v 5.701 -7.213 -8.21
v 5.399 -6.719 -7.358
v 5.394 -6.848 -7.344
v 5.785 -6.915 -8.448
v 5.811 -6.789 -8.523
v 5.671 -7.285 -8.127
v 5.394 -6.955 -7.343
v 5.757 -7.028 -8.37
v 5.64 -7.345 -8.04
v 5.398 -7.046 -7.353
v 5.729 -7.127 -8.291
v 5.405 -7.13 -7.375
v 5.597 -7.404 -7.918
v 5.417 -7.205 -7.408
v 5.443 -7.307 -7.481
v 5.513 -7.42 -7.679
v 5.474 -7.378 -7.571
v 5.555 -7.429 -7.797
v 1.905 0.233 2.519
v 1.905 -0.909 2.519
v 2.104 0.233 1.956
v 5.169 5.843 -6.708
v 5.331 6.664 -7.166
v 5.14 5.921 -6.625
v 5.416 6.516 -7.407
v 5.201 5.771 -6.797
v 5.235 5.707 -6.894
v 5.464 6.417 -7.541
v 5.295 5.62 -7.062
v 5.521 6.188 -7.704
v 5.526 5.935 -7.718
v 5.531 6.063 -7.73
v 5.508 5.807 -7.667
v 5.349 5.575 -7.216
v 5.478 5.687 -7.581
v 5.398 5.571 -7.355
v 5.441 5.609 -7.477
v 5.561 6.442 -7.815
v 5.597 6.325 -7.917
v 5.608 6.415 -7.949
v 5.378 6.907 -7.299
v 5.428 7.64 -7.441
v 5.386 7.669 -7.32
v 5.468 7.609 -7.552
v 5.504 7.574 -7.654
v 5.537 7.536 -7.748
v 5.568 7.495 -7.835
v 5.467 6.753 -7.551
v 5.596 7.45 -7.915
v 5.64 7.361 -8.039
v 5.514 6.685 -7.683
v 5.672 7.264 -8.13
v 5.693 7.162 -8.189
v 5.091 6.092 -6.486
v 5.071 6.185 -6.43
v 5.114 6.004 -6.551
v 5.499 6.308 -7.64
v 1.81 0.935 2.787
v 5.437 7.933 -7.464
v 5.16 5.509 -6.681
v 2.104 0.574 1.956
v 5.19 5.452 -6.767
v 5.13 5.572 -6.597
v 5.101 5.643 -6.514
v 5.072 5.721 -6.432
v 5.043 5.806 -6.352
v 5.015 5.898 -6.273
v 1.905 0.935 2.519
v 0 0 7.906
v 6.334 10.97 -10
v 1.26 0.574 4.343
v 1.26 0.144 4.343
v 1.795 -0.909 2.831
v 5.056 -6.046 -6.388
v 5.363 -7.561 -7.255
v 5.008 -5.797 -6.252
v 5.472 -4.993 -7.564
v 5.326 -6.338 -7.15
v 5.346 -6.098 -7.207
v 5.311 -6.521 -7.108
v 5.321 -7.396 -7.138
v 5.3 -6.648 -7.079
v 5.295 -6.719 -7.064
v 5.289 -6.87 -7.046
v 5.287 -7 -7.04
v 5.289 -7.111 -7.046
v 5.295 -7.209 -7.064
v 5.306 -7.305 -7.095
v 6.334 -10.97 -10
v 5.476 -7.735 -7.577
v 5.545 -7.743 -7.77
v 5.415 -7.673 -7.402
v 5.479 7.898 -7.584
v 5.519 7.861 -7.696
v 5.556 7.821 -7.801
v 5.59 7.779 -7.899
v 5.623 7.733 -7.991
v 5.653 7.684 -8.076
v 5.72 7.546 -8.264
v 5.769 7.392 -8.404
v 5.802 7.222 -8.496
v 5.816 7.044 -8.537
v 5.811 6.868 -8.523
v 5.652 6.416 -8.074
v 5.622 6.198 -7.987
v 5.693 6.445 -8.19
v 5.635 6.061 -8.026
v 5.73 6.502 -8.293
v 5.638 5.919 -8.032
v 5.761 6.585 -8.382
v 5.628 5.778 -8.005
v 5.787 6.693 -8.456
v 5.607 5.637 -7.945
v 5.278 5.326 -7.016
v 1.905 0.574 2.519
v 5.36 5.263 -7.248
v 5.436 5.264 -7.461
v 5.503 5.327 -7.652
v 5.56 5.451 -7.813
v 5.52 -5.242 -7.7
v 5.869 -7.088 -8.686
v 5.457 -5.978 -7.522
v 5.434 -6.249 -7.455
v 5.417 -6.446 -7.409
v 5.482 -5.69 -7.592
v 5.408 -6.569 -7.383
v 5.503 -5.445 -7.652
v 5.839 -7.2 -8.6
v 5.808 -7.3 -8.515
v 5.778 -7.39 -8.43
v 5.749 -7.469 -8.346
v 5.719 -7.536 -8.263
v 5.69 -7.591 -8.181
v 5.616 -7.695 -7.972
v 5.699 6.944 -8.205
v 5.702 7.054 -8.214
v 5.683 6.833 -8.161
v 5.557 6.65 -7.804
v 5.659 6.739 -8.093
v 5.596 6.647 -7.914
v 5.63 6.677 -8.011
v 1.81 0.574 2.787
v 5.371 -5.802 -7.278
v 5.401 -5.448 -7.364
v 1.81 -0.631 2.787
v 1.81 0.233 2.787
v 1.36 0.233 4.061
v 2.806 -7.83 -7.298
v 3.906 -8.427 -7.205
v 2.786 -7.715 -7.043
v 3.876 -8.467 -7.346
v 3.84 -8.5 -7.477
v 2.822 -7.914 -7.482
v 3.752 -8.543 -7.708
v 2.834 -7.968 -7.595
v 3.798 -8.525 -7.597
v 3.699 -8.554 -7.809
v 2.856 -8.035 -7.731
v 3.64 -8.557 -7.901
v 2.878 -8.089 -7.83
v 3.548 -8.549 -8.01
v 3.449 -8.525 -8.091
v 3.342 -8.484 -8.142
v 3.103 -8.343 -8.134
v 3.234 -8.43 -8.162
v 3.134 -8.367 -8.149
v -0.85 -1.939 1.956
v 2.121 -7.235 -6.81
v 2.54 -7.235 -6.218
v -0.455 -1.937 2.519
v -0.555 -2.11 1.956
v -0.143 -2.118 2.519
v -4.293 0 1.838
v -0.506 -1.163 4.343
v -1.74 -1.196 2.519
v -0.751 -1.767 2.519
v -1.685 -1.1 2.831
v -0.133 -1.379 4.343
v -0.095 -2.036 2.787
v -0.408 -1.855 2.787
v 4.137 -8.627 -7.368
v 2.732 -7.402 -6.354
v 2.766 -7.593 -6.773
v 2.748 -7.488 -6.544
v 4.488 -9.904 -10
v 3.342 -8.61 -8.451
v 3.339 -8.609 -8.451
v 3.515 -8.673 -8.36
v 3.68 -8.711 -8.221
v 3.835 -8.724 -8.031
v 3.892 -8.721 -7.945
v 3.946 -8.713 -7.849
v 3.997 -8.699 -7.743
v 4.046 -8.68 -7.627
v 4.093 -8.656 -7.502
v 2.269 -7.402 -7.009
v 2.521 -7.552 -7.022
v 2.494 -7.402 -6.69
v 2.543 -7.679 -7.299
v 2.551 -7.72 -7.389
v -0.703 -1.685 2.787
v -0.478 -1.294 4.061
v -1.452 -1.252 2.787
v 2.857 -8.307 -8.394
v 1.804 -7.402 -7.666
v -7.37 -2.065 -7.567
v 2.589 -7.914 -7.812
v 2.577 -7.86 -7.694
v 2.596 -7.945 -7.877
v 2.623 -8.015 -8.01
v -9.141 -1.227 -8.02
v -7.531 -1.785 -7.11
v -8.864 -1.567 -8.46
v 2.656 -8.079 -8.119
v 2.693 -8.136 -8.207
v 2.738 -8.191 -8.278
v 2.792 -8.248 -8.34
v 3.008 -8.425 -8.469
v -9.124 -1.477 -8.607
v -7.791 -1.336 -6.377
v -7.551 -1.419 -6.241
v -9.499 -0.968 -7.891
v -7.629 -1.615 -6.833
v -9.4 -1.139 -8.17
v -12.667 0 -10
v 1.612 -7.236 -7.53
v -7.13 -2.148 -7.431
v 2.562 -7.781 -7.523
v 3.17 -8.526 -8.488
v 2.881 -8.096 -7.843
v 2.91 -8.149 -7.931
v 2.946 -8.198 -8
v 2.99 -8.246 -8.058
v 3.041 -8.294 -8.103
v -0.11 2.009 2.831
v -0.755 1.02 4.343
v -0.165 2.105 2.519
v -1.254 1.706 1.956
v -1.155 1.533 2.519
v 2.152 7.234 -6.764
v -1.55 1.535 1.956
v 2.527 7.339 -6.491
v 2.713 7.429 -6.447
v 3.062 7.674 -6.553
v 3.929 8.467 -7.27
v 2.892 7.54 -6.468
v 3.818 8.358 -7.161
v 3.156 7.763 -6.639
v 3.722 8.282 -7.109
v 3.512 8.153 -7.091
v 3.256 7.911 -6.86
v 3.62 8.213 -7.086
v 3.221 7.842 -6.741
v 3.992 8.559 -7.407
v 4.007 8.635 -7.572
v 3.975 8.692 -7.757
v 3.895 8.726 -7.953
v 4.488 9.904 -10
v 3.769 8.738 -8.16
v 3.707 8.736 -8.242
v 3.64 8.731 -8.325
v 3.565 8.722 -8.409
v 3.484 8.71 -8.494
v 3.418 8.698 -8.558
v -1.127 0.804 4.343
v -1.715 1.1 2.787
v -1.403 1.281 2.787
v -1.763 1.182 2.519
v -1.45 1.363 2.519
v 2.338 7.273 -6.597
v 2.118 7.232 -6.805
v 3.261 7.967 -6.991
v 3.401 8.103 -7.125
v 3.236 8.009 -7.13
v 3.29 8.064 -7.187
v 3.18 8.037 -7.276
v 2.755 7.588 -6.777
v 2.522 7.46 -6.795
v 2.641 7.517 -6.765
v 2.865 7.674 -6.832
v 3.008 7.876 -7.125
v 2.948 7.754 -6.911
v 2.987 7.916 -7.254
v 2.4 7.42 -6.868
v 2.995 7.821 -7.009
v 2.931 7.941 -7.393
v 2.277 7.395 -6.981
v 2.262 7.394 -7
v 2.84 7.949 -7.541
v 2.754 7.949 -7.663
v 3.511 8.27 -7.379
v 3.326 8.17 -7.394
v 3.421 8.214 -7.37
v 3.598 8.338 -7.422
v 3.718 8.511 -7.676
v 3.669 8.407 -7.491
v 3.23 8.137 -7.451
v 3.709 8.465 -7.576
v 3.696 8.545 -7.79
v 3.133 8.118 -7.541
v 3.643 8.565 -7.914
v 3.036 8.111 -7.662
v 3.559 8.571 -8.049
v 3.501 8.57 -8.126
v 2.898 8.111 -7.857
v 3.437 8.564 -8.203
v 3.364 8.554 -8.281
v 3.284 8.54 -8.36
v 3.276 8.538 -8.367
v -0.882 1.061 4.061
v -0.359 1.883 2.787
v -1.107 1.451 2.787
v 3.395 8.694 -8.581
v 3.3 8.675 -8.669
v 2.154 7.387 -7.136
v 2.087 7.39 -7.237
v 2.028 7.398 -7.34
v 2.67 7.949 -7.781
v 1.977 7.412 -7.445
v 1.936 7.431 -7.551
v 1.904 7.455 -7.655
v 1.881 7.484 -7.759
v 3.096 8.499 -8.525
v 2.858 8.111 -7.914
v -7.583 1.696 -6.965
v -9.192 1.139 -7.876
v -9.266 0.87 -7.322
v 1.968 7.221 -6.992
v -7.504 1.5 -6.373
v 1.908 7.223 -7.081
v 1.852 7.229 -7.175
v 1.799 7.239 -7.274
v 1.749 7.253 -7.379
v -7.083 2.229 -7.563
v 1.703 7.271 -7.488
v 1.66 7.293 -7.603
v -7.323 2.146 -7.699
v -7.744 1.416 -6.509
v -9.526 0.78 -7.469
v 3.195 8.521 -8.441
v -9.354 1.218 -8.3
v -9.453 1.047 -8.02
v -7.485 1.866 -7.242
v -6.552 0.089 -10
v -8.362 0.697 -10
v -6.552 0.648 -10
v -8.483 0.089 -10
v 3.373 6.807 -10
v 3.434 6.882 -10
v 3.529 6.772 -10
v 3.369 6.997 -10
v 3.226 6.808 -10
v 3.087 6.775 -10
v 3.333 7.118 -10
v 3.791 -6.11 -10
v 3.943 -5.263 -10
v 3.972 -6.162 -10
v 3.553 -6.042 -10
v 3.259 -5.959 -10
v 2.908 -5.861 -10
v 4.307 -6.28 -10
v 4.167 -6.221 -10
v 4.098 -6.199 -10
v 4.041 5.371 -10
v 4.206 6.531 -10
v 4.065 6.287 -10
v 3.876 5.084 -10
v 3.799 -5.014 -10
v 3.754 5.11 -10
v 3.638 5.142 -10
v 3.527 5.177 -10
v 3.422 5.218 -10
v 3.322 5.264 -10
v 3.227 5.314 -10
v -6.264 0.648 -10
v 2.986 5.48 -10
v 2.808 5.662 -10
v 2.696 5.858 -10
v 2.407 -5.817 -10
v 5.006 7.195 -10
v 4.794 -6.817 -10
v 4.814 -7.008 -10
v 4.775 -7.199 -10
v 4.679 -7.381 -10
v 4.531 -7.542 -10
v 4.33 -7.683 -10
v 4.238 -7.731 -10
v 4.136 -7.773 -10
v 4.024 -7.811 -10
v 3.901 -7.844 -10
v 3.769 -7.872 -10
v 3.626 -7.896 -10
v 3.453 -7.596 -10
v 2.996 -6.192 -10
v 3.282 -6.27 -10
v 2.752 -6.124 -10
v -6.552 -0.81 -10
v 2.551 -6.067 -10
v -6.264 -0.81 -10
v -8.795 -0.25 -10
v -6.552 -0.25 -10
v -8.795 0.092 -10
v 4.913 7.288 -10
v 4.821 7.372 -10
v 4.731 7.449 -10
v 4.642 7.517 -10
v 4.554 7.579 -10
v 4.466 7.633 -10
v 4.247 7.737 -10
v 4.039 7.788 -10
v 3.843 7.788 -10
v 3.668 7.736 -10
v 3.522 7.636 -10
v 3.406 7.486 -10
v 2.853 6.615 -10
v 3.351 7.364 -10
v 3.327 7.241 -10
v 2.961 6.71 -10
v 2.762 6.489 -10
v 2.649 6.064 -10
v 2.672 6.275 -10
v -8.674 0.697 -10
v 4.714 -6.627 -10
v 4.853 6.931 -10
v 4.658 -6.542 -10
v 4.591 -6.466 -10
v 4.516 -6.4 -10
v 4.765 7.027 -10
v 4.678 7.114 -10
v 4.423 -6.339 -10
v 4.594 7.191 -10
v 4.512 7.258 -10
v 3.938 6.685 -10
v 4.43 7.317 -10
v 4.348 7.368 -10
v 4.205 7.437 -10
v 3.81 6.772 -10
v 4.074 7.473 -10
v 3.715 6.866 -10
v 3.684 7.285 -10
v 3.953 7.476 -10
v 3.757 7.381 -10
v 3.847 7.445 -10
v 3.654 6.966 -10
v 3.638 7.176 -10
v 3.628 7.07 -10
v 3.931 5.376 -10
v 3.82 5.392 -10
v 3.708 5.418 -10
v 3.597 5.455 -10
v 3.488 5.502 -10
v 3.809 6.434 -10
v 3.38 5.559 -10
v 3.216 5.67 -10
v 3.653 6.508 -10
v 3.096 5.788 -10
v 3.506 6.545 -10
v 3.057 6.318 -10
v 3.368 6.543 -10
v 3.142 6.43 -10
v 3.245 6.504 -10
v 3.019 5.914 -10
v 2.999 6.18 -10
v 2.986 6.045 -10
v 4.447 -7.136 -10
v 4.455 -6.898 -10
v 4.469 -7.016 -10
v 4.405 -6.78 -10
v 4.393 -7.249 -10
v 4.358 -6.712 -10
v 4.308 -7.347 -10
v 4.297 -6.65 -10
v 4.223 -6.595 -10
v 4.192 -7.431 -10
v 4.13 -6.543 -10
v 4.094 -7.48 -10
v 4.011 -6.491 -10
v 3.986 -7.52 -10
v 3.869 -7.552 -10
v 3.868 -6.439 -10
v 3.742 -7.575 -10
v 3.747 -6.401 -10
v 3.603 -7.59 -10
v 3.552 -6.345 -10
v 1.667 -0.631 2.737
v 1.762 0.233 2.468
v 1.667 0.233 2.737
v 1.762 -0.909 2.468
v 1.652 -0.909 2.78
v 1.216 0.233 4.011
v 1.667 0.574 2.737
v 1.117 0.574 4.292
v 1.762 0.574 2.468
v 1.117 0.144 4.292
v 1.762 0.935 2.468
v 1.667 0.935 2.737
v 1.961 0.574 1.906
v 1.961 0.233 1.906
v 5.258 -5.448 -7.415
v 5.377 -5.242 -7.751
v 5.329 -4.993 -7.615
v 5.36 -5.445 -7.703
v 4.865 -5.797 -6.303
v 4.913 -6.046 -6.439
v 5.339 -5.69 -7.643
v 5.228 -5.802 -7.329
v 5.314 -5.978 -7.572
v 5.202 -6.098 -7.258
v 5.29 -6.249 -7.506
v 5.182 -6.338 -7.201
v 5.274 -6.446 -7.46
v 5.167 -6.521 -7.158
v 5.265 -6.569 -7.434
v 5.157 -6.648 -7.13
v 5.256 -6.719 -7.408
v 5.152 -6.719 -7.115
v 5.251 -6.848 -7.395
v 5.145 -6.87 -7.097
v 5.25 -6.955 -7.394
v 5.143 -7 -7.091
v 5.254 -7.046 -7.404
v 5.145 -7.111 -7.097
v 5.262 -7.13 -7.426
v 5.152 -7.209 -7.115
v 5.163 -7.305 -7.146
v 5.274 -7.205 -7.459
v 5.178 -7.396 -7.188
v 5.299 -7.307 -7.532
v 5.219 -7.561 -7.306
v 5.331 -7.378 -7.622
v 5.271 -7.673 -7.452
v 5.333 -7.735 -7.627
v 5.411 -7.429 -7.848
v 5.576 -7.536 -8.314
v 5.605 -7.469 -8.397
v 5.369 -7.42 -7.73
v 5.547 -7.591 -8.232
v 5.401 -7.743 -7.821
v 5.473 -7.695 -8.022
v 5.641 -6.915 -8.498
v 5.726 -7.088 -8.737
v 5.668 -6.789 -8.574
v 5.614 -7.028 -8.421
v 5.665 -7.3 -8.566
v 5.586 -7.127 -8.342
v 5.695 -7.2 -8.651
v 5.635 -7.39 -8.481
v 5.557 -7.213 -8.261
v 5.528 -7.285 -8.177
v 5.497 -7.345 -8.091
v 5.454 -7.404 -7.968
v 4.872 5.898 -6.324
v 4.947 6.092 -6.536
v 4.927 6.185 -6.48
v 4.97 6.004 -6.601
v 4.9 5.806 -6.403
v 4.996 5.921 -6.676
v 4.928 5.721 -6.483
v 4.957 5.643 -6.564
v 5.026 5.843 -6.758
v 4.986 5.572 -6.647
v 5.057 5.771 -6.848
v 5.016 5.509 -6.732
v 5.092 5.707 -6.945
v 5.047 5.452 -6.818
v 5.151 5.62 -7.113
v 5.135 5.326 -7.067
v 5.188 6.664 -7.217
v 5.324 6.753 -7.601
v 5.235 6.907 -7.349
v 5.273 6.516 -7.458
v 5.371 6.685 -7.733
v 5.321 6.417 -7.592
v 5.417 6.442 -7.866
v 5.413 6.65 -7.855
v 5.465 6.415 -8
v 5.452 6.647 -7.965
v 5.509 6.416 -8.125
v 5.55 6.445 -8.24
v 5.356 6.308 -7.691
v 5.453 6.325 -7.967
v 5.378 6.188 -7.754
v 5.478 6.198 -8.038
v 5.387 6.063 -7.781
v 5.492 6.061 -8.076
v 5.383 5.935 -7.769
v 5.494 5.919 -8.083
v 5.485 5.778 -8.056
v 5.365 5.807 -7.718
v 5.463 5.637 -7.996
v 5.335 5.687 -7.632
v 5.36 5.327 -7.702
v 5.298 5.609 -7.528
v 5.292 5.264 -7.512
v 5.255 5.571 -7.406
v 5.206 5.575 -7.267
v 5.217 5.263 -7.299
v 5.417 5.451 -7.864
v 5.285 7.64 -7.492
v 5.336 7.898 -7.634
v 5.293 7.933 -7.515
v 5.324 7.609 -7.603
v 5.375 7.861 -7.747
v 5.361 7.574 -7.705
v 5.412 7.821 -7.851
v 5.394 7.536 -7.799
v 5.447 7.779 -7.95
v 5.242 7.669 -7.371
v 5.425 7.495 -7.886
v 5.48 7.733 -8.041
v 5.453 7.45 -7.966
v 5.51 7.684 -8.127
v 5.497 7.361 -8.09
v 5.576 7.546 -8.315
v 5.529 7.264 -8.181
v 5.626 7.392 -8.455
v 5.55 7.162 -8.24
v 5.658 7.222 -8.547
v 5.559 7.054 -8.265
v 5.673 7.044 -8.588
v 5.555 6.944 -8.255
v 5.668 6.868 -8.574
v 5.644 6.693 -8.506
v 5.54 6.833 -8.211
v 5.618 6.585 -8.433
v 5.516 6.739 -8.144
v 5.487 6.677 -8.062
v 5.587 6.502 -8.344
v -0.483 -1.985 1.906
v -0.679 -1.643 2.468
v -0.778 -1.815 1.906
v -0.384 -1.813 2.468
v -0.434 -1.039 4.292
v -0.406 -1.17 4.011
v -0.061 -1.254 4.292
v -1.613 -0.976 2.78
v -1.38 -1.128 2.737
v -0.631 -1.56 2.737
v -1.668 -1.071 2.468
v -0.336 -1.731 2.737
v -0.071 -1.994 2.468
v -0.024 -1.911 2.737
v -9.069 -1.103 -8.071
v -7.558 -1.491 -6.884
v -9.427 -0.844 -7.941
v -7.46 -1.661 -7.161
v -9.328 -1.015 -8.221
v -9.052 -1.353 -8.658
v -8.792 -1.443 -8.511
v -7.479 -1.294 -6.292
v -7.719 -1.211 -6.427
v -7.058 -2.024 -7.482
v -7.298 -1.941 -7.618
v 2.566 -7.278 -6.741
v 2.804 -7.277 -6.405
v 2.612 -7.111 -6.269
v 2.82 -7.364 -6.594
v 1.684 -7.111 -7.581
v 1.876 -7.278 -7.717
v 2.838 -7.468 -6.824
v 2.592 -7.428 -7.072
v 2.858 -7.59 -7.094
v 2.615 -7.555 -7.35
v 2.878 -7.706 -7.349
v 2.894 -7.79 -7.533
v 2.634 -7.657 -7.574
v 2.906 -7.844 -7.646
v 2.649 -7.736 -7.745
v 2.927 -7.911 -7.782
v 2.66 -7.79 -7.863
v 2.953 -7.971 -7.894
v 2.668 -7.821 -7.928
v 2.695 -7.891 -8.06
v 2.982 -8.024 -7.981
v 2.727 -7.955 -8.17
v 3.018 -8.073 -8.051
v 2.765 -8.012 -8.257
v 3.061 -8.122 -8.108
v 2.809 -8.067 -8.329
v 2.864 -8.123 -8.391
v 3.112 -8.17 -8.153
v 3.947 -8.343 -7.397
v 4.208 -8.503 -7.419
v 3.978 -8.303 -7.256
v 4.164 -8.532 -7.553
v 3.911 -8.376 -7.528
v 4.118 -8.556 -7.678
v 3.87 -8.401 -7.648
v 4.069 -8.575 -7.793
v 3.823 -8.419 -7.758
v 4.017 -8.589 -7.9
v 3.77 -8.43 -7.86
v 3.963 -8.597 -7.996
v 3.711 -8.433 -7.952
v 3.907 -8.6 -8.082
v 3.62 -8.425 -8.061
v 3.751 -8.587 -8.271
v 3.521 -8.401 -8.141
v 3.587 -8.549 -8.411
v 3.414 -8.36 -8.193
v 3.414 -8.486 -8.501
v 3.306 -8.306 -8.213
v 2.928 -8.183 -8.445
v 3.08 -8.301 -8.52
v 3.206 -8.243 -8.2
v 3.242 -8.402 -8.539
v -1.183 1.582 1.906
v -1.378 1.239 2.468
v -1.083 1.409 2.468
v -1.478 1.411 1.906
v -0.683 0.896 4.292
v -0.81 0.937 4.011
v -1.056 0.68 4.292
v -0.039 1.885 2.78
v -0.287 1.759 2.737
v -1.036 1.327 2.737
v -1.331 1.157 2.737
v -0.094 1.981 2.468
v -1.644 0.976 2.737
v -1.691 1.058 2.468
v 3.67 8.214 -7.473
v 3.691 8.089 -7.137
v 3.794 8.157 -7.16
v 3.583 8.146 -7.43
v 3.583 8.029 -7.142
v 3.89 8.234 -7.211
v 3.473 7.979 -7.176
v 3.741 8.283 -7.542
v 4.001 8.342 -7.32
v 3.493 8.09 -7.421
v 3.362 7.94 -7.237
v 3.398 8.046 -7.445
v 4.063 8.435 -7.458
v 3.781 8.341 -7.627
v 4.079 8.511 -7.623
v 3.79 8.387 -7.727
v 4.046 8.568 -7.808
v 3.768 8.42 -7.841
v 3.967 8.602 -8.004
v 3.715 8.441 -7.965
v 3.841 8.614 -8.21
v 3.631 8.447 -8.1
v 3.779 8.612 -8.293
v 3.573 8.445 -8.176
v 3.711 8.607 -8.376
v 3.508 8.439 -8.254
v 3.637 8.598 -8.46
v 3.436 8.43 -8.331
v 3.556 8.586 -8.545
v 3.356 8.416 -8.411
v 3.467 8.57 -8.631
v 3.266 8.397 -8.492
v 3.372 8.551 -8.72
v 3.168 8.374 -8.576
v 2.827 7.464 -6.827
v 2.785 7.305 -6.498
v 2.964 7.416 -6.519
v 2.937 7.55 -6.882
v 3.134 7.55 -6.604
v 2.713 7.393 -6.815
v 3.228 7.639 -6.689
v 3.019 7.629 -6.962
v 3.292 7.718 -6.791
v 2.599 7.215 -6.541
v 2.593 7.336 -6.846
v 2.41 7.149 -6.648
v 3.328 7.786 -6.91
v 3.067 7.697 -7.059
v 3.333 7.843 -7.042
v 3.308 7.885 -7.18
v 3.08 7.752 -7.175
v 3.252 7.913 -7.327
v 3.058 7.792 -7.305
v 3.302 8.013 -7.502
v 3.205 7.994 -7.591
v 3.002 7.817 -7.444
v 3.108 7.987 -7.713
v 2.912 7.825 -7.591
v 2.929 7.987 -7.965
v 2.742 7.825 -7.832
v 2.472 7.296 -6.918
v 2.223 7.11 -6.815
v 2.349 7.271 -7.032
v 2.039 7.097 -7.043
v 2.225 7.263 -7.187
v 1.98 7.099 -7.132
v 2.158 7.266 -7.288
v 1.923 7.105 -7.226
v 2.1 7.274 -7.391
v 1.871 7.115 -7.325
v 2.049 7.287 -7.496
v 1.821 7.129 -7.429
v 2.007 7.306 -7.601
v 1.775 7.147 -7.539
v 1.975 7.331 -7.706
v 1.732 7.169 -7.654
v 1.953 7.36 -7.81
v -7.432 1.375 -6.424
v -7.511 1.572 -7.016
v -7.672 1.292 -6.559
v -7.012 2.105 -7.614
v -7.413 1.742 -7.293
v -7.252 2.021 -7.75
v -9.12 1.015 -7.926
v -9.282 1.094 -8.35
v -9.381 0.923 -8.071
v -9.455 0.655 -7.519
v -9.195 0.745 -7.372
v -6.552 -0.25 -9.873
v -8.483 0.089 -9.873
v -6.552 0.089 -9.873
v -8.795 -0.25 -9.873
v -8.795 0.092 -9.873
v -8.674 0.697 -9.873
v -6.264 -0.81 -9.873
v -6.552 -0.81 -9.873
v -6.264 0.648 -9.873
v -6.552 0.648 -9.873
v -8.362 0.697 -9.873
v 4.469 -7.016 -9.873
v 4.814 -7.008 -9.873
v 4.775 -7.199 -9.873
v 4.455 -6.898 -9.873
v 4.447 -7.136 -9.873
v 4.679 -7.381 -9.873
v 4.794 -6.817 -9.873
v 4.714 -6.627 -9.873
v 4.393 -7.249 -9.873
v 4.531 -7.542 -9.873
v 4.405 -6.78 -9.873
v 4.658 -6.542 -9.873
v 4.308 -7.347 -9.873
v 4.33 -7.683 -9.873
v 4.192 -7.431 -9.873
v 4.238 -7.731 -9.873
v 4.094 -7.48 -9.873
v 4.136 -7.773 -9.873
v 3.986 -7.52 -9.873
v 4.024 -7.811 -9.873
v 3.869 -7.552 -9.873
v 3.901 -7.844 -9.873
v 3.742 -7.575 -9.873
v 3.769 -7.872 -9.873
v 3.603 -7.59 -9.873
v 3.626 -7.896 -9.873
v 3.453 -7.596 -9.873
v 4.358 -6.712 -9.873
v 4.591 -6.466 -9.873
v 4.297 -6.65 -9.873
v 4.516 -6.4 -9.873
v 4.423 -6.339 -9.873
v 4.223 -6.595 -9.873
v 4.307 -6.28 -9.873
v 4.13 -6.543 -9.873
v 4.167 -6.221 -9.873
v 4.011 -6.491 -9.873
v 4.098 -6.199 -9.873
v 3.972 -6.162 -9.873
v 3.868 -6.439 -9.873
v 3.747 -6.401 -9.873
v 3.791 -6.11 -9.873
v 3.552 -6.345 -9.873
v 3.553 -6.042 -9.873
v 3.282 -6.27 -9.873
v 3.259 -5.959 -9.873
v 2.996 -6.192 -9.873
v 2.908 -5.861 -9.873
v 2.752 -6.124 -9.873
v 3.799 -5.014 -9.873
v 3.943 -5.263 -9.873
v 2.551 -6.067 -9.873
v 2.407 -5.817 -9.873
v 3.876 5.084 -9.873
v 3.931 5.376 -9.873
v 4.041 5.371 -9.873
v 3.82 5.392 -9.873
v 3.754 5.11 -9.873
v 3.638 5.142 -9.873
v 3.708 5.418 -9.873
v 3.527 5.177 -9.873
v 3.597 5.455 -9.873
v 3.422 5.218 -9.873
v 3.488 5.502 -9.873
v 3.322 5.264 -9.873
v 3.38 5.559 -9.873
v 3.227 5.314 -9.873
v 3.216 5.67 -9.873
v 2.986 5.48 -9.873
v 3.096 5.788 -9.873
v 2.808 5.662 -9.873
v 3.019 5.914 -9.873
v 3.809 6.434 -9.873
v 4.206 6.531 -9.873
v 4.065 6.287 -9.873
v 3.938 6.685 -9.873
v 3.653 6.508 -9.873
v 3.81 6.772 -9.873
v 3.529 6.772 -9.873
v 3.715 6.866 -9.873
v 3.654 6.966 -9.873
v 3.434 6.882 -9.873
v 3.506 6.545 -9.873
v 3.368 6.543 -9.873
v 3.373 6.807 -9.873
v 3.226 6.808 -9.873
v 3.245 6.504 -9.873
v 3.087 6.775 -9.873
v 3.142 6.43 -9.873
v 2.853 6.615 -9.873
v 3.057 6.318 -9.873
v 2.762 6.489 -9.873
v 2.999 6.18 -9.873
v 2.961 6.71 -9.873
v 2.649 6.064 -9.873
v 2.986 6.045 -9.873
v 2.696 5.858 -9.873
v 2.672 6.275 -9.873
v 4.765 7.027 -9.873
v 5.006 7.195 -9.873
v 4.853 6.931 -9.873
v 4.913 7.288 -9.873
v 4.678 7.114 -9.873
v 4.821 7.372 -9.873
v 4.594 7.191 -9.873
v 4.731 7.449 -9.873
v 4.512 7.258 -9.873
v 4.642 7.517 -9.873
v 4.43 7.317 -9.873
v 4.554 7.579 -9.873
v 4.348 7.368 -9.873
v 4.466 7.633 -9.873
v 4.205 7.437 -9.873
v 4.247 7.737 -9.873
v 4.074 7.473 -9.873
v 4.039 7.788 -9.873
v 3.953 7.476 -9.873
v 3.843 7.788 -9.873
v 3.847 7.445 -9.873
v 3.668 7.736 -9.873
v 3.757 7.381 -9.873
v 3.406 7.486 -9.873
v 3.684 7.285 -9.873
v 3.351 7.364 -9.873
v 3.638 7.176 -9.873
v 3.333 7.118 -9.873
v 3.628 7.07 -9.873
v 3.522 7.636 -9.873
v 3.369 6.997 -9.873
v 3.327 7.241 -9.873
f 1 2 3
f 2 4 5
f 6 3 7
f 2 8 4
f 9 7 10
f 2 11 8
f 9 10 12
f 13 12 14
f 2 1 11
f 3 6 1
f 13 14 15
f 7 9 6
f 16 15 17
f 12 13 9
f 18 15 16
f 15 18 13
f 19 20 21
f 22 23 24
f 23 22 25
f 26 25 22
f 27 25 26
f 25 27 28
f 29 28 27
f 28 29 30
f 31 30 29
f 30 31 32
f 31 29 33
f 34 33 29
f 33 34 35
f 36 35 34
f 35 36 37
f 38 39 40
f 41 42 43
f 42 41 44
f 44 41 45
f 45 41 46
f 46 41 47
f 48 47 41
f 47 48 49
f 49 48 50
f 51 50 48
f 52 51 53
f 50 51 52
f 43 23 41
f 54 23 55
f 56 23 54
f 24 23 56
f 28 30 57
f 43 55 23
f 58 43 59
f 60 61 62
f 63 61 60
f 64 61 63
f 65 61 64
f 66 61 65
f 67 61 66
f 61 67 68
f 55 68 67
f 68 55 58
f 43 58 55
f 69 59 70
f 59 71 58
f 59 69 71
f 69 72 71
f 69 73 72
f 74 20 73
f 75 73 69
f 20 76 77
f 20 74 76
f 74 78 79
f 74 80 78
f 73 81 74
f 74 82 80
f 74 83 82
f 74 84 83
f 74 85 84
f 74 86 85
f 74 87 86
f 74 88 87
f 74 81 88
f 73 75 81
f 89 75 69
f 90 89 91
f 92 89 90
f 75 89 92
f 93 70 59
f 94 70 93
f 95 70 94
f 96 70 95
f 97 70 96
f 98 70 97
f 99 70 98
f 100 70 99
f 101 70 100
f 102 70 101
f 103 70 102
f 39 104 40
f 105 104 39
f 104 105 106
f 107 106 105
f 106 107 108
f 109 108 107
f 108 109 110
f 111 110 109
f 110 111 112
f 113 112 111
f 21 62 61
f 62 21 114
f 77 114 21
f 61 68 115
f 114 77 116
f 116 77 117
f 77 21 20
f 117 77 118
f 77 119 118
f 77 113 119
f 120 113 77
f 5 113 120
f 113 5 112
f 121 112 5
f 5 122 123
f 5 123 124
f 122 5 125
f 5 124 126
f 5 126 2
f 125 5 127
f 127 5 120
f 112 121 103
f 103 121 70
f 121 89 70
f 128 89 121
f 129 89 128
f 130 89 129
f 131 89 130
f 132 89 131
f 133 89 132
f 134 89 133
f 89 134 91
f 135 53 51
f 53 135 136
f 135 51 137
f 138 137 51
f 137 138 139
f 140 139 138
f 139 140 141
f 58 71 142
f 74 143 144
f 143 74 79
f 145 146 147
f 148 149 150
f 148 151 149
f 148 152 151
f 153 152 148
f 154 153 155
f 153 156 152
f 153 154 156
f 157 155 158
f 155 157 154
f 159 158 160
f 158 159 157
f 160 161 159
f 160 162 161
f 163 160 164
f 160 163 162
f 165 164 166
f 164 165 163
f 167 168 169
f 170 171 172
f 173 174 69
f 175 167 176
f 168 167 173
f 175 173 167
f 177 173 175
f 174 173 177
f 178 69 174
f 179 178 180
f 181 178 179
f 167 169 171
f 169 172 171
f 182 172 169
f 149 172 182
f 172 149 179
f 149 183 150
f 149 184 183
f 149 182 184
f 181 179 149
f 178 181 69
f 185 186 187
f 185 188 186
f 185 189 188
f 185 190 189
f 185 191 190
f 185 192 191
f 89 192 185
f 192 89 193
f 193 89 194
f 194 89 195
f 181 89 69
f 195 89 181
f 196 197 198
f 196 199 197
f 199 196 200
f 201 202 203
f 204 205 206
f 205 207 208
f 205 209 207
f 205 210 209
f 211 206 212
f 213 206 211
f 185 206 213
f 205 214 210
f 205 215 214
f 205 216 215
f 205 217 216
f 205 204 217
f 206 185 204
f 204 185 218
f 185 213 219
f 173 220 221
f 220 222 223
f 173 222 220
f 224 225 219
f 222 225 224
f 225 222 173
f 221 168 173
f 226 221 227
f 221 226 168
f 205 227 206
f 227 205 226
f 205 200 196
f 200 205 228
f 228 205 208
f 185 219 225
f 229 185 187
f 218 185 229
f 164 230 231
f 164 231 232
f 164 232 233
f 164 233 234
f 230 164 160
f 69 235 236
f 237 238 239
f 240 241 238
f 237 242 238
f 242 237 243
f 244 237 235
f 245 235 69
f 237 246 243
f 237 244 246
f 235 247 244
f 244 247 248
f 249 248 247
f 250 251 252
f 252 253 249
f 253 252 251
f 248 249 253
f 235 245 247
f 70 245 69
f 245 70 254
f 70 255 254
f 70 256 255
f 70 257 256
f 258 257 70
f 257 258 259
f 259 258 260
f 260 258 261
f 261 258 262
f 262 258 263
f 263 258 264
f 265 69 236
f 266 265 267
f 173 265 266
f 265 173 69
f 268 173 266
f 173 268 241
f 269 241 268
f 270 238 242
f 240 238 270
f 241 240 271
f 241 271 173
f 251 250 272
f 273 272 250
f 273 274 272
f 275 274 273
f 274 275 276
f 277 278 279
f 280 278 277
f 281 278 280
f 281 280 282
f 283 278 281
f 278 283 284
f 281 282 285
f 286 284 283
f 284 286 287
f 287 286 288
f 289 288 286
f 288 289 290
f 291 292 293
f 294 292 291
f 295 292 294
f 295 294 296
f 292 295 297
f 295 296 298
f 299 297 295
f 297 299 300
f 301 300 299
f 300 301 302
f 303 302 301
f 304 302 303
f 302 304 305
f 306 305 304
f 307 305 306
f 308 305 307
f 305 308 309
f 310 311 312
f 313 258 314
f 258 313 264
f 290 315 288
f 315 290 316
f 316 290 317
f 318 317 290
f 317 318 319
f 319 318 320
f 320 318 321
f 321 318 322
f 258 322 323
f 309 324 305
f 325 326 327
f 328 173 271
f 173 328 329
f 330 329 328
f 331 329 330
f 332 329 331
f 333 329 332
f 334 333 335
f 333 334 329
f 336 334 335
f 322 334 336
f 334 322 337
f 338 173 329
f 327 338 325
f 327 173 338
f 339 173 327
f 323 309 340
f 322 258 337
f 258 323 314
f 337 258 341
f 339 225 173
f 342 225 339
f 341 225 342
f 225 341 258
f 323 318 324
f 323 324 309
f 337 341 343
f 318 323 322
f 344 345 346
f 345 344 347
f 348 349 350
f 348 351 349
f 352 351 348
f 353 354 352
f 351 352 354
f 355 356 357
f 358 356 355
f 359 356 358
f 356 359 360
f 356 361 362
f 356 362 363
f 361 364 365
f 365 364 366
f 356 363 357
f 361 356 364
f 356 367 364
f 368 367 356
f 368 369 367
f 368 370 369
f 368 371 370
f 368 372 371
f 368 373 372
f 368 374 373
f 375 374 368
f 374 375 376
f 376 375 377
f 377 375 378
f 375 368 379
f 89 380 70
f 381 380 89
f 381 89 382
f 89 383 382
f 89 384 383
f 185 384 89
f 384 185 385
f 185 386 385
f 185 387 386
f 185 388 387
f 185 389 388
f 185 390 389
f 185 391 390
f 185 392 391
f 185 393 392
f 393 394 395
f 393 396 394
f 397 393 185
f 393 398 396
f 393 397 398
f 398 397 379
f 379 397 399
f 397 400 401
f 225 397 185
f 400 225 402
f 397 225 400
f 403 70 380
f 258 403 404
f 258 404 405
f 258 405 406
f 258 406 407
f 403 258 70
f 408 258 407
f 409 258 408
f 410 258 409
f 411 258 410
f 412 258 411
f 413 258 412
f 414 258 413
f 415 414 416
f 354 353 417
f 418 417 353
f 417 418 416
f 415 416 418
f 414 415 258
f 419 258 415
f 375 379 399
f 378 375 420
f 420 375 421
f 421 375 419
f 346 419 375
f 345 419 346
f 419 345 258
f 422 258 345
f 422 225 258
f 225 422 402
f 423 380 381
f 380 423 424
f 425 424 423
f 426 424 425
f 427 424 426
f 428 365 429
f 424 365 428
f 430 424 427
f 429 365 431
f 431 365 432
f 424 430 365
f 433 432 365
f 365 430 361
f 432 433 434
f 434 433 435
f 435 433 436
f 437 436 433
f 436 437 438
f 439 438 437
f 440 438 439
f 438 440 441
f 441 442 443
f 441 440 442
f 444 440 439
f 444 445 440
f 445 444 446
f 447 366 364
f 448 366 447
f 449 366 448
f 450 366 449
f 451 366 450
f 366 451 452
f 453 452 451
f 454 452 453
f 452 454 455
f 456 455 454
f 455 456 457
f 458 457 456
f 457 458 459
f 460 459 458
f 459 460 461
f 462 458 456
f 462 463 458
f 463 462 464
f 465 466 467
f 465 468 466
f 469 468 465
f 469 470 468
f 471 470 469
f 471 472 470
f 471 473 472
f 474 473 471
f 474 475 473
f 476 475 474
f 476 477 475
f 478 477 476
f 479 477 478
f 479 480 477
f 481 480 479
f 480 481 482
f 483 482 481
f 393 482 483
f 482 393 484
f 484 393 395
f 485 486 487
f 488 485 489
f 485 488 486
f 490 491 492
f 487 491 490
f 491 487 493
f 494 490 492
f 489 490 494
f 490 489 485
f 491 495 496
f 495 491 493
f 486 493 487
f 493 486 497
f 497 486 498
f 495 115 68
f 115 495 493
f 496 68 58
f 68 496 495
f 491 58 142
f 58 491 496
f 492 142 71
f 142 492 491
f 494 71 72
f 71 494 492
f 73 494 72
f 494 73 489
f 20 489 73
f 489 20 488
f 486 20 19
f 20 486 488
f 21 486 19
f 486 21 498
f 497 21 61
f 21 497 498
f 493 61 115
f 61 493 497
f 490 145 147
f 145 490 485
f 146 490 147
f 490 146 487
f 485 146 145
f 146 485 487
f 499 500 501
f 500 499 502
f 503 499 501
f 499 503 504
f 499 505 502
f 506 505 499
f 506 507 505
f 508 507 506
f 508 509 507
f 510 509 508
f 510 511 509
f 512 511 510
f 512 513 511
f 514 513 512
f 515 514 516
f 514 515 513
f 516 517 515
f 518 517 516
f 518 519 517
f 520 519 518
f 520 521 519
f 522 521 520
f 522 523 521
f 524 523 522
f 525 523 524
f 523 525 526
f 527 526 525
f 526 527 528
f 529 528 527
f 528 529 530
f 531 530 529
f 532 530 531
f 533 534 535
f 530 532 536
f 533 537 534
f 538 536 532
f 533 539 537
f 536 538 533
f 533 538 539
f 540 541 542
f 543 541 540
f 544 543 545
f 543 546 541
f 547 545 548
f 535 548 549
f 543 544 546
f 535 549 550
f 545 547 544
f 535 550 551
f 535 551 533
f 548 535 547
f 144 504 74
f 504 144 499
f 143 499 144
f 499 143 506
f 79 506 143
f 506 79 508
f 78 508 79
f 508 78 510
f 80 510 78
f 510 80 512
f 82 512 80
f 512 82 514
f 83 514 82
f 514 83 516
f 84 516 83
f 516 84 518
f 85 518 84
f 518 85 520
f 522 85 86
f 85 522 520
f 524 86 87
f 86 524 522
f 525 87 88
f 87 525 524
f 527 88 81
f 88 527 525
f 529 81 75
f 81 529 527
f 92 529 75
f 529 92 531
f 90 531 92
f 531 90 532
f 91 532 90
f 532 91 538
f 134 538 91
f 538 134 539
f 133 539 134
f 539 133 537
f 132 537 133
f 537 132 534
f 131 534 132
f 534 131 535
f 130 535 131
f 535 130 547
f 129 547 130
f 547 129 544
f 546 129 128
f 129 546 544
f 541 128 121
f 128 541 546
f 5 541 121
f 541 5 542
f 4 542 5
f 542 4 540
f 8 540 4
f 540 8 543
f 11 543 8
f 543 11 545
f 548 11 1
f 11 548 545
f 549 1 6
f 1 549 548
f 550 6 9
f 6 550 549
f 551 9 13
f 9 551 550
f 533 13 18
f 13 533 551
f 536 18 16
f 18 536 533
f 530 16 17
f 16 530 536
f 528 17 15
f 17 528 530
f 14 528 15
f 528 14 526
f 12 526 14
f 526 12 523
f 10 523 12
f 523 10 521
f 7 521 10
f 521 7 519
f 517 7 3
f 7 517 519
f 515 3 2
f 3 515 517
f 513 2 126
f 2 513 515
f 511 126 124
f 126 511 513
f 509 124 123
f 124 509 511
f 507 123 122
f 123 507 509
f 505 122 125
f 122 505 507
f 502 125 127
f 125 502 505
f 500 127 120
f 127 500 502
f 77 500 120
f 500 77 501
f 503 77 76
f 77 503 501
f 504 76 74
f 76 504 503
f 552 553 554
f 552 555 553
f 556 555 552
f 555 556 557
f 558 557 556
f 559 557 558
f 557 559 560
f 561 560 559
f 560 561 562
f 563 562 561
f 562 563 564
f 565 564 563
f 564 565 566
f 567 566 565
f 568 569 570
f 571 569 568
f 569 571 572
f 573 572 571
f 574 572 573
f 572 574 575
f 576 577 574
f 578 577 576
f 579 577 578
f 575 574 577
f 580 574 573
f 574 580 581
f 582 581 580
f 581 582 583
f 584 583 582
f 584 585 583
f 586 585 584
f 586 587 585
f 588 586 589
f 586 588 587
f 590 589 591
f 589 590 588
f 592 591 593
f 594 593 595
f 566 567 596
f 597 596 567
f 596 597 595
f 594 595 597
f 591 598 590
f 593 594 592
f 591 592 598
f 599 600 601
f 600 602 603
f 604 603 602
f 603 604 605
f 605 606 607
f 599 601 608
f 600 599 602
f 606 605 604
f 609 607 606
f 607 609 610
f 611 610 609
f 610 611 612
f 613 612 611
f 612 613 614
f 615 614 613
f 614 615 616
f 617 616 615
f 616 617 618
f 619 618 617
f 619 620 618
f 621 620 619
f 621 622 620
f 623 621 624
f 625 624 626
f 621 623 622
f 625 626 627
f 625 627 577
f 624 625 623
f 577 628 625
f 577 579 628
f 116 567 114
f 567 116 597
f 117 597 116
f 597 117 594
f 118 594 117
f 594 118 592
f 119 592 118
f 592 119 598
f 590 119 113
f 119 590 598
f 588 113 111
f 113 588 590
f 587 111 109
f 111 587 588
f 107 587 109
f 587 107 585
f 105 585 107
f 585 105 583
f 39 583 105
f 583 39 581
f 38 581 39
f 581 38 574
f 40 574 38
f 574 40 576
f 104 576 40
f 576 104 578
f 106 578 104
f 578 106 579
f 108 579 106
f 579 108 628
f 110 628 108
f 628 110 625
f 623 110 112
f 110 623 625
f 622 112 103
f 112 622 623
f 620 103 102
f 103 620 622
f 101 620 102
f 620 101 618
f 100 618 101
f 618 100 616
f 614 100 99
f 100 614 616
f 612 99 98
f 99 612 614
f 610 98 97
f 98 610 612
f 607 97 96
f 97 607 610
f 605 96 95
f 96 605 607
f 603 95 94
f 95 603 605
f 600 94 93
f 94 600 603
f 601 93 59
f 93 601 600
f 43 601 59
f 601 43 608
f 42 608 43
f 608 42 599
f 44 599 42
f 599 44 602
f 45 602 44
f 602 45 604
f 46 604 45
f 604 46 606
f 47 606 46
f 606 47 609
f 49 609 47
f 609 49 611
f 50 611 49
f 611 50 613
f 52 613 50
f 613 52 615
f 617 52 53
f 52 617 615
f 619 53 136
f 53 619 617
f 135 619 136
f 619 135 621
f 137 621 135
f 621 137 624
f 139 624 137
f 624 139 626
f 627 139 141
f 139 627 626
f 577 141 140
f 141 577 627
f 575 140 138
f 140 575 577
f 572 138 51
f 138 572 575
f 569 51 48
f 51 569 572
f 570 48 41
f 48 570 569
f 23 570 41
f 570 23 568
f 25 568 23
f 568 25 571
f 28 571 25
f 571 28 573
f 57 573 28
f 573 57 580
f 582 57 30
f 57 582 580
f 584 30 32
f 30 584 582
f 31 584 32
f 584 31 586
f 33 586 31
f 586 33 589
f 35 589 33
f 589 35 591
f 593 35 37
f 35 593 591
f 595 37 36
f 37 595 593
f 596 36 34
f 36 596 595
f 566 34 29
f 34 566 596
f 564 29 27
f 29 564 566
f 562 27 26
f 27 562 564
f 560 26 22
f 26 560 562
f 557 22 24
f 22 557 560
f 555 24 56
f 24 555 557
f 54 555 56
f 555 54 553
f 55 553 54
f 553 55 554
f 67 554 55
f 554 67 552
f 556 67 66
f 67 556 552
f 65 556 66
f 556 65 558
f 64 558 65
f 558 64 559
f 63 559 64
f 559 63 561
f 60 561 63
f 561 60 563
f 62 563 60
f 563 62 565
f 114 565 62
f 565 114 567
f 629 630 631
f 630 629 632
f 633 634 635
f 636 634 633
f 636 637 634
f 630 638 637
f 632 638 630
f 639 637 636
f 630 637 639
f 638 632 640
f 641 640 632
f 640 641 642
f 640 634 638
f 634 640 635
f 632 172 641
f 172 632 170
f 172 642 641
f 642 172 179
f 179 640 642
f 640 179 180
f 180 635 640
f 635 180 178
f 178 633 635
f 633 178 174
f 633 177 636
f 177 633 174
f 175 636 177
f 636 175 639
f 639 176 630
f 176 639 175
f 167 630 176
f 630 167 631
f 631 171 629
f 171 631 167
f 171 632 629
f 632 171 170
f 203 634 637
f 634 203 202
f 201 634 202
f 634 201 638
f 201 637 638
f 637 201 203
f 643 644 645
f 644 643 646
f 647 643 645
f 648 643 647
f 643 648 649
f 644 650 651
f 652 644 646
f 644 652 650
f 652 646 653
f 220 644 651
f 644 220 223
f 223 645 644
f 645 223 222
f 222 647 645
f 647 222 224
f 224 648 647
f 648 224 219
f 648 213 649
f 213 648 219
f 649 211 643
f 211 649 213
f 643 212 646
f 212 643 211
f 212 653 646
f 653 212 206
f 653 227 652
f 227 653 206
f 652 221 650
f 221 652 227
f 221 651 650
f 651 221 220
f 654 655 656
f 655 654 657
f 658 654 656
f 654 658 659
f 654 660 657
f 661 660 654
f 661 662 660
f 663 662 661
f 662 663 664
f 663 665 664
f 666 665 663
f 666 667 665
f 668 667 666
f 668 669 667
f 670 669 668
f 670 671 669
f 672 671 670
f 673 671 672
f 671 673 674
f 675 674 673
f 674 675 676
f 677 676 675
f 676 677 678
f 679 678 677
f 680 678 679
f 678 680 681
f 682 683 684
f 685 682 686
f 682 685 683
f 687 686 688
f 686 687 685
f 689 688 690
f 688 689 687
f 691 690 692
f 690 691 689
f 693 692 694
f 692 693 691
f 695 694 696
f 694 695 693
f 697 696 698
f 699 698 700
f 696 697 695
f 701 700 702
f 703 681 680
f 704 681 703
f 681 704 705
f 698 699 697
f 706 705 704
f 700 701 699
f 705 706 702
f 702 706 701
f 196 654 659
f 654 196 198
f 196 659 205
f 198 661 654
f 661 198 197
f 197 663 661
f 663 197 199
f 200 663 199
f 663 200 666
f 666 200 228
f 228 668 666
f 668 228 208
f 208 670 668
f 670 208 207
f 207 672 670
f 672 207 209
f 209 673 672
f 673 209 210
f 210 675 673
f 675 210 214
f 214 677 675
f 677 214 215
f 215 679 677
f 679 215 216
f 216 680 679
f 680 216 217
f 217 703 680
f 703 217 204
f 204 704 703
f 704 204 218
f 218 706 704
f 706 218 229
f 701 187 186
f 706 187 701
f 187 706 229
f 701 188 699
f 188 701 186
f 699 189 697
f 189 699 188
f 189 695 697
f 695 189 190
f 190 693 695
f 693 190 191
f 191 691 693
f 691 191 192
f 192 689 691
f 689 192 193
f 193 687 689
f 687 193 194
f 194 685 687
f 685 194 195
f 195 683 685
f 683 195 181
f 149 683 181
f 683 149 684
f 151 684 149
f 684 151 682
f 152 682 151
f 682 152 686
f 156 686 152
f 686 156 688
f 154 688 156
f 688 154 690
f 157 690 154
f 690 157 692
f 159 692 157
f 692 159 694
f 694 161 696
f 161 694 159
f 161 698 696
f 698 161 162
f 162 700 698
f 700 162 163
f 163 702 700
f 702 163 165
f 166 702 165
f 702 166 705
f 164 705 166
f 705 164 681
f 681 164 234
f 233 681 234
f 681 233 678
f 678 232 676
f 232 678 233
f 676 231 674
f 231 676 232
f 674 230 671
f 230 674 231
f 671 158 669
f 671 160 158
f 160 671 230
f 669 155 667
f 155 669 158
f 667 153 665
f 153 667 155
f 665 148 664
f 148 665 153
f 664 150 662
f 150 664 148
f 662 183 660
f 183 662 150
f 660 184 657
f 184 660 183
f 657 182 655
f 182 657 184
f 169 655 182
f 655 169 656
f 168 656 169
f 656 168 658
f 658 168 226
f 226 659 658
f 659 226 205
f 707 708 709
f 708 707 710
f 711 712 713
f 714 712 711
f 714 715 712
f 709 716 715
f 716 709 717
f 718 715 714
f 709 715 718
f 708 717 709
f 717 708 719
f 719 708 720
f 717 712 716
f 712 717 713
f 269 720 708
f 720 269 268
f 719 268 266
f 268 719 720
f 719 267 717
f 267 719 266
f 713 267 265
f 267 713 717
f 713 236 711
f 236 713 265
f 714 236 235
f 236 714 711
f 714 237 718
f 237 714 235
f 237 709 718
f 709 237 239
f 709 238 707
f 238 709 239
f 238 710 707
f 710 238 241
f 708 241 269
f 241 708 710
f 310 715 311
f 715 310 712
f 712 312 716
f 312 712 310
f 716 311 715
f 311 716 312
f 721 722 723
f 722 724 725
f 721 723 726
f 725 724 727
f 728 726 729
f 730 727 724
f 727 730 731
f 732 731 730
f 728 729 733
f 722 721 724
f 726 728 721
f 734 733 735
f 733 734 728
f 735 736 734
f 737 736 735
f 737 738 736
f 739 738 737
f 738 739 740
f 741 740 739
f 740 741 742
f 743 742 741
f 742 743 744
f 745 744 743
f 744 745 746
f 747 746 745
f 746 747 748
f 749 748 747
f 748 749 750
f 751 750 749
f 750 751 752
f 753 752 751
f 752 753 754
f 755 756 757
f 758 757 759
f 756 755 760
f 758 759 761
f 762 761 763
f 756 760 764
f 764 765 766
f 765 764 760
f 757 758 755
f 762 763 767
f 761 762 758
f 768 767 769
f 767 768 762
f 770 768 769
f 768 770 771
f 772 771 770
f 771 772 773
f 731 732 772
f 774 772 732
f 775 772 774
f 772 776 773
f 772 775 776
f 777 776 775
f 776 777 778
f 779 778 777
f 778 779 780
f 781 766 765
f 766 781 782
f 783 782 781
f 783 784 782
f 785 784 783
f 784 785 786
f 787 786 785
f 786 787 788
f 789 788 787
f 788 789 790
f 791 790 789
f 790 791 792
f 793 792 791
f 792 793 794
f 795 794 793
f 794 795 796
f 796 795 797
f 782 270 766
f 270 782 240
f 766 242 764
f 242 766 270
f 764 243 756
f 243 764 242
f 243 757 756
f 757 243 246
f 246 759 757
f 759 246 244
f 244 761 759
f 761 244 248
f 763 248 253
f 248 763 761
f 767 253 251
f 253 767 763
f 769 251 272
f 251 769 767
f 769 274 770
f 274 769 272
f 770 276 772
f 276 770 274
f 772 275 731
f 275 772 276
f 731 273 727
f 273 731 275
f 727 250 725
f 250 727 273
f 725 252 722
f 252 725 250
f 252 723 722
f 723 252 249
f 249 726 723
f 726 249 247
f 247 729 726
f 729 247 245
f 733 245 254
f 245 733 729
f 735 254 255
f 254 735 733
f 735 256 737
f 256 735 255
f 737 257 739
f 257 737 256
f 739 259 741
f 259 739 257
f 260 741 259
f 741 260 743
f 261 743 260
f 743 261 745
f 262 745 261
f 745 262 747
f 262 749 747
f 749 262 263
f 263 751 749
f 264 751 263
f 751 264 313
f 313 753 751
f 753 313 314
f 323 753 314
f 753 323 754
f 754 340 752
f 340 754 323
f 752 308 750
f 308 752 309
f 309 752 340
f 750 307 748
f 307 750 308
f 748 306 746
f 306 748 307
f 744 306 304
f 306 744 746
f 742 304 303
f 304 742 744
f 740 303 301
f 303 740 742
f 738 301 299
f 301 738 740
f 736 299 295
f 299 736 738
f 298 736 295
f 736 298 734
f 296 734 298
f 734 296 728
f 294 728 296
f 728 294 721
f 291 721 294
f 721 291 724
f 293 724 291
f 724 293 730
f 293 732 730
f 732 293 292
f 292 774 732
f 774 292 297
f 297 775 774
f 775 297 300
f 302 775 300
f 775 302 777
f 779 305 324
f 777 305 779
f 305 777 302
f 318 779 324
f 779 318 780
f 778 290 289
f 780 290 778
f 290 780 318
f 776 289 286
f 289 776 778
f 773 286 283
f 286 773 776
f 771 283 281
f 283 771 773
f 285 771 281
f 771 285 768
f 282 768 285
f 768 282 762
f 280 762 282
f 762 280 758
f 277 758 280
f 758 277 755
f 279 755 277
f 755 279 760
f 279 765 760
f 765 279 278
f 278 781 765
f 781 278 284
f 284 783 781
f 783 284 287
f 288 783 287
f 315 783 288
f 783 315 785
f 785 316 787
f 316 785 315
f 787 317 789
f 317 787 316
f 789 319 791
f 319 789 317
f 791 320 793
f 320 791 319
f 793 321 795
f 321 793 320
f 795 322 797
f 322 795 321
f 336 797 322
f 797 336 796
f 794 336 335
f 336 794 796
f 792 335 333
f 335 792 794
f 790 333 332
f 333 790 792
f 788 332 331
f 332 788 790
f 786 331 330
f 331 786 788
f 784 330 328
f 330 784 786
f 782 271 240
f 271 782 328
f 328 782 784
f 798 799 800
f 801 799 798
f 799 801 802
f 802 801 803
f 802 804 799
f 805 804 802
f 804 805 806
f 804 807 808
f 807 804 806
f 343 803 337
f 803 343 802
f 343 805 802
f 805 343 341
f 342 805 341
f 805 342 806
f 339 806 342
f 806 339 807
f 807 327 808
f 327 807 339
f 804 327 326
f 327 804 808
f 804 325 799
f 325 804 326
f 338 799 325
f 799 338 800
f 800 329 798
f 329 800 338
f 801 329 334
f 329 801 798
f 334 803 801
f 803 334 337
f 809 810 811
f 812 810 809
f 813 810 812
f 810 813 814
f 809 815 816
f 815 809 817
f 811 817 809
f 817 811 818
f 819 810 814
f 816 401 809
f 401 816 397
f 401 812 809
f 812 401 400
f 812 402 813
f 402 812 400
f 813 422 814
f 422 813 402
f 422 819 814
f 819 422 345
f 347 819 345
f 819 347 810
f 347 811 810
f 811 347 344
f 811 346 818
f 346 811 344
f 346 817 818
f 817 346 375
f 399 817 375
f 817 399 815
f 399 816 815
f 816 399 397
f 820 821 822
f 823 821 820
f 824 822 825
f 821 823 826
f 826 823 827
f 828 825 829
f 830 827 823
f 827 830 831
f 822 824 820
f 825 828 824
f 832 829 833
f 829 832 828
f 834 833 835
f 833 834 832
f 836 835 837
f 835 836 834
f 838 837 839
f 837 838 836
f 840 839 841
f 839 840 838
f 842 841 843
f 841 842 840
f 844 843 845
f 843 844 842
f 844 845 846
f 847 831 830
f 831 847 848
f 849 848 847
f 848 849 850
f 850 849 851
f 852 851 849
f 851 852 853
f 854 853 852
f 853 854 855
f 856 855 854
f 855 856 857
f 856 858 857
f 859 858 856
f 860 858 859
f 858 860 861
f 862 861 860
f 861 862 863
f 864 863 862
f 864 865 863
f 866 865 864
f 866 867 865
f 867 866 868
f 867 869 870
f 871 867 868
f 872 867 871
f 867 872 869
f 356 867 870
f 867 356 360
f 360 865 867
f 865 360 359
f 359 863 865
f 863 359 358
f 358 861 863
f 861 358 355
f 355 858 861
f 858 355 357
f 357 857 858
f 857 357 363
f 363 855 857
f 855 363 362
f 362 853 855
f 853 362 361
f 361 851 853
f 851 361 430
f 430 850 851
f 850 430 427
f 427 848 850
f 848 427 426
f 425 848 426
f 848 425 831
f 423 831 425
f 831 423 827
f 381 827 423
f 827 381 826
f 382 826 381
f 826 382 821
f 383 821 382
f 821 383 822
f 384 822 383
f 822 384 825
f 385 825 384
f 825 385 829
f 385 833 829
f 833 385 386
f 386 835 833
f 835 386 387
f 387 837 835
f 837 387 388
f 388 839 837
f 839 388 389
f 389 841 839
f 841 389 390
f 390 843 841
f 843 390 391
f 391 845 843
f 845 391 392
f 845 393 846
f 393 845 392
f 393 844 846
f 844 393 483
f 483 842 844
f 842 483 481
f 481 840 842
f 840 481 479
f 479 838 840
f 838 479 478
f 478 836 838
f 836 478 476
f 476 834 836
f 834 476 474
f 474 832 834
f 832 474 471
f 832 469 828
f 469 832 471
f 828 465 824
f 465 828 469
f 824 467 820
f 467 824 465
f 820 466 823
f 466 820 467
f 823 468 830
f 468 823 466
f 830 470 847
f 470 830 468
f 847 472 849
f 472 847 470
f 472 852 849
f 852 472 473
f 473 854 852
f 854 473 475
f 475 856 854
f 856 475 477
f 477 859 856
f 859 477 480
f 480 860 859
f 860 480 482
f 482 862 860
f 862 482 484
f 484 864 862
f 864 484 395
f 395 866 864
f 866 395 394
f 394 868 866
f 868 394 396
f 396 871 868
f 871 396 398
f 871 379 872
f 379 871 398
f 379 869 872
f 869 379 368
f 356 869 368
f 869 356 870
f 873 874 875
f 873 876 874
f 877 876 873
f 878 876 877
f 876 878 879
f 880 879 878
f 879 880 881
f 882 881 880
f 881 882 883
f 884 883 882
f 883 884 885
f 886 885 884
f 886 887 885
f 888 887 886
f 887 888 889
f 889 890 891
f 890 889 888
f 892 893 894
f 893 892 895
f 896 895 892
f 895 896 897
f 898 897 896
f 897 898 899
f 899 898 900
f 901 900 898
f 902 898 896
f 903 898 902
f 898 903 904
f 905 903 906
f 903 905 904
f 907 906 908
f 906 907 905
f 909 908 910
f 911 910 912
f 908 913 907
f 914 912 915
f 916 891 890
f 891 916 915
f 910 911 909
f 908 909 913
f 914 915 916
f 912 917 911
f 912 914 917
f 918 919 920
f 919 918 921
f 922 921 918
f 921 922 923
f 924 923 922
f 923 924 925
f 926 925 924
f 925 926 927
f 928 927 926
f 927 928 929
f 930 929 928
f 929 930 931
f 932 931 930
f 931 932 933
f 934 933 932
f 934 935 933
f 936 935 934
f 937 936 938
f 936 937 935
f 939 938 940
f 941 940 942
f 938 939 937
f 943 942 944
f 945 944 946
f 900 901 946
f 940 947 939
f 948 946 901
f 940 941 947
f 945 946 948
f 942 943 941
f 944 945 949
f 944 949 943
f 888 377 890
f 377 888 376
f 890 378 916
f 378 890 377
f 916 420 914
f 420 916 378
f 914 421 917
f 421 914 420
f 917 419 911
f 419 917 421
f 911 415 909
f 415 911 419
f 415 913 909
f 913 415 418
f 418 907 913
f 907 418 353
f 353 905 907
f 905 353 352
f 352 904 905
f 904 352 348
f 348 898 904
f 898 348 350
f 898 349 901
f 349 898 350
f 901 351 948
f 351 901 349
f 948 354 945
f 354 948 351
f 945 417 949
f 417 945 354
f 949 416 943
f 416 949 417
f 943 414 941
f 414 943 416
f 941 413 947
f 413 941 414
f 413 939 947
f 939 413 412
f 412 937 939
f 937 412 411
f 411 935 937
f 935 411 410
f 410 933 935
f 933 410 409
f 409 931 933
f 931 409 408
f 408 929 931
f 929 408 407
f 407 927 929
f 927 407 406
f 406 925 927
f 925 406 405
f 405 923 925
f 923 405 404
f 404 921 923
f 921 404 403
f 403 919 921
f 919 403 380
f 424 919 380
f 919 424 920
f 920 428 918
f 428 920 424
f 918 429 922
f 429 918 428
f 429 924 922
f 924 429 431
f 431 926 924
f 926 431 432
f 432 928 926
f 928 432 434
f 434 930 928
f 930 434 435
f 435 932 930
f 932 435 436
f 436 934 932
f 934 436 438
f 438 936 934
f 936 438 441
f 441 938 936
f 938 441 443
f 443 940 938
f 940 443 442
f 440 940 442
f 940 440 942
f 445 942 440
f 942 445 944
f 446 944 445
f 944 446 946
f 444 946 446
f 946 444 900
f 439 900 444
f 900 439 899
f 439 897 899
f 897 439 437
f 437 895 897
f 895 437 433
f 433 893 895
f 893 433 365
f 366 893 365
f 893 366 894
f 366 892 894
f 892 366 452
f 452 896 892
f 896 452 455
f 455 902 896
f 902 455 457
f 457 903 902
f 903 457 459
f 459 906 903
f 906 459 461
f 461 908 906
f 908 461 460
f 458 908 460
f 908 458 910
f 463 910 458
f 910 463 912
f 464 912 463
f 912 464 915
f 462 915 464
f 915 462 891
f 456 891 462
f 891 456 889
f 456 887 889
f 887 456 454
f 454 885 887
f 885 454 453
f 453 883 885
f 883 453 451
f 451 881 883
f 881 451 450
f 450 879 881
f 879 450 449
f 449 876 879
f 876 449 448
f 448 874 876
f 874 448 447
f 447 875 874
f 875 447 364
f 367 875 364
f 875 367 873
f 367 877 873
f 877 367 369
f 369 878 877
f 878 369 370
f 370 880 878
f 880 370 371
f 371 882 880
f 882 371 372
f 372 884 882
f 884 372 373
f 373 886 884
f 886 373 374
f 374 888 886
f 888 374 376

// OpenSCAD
module draw_rot_dig(a, angle, dist){
    
        translate([-cos(angle)*dist, -sin(angle)*dist, 0])
        rotate([0, 180, angle+90])
        linear_extrude(4){
            text(a, 5, font = "3270 Nerdfont", halign = "center", valign = "center");
        }
    
}

module example003()
{
    cube_side = 20;
    magic_dist = 16.2 * (cube_side/20);
    magic_degree = 70.52;// Just a tangent.
    
          color("#444444")
    scale([0.5, 0.5, 0.5])
  difference() {
        translate([0, 0, 0])
      difference(){
        union() {
          color("black")
          cylinder(2*cube_side, 1.5*cube_side, center = true);
        }
    
        union() {
          //color("red")
            union(){
                translate([magic_dist, 0, 0])
                rotate([0, magic_degree, 0])
                cube([4*cube_side, 4*cube_side, cube_side], center = true);
            };
          //color("blue")
            union(){
                translate([cos(-120)*magic_dist, sin(-120)*magic_dist, 0])
                rotate([0, magic_degree, -120])
                cube([4*cube_side, 4*cube_side, cube_side], center = true);
            };
          //color("green")
            
            union(){
                translate([cos(120)*magic_dist, sin(120)*magic_dist, 0])
                rotate([0, magic_degree, 120])
                cube([4*cube_side, 4*cube_side, cube_side], center = true);
            };
        }
    };
        
        translate([0, 0, -8])
        union(){
        
            translate([magic_dist/2, 0, 0])
            rotate([0, magic_degree, 0])
            rotate([0, 180, 180])
            
            union(){
                    draw_rot_dig("4", 0, cube_side*3/4);
                    draw_rot_dig("2", -120, cube_side*3/4);
                    draw_rot_dig("3", 120, cube_side*3/4);
            };
            
            rotate([0, 0, -120])
            translate([magic_dist/2, 0, 0])
            rotate([0, magic_degree, 0])
            rotate([0, 180, 180])
            
            union(){
                    draw_rot_dig("4", 0, cube_side*3/4);
                    draw_rot_dig("1", -120, cube_side*3/4);
                    draw_rot_dig("2", 120, cube_side*3/4);
            };
            
            rotate([0, 0, 120])
            translate([magic_dist/2, 0, 0])
            rotate([0, magic_degree, 0])
            rotate([0, 180, 180])
            
            union(){
                    draw_rot_dig("4", 0, cube_side*3/4);
                    draw_rot_dig("3", -120, cube_side*3/4);
                    draw_rot_dig("1", 120, cube_side*3/4);
            };
            
            
            translate([0, 0, -magic_dist*0.725])
            union(){
                draw_rot_dig("1", 0, cube_side*3/4);
                draw_rot_dig("2", 120, cube_side*3/4);
                draw_rot_dig("3", -120, cube_side*3/4);
            };
            
        };
        
        
  }
}

echo(version=version());

example003();

// Written by Clifford Wolf <clifford@clifford.at> and Marius
// Kintel <marius@kintel.net>
//
// To the extent possible under law, the author(s) have dedicated all
// copyright and related and neighboring rights to this software to the
// public domain worldwide. This software is distributed without any
// warranty.
//
// You should have received a copy of the CC0 Public Domain
// Dedication along with this software.
// If not, see <http://creativecommons.org/publicdomain/zero/1.0/>.
